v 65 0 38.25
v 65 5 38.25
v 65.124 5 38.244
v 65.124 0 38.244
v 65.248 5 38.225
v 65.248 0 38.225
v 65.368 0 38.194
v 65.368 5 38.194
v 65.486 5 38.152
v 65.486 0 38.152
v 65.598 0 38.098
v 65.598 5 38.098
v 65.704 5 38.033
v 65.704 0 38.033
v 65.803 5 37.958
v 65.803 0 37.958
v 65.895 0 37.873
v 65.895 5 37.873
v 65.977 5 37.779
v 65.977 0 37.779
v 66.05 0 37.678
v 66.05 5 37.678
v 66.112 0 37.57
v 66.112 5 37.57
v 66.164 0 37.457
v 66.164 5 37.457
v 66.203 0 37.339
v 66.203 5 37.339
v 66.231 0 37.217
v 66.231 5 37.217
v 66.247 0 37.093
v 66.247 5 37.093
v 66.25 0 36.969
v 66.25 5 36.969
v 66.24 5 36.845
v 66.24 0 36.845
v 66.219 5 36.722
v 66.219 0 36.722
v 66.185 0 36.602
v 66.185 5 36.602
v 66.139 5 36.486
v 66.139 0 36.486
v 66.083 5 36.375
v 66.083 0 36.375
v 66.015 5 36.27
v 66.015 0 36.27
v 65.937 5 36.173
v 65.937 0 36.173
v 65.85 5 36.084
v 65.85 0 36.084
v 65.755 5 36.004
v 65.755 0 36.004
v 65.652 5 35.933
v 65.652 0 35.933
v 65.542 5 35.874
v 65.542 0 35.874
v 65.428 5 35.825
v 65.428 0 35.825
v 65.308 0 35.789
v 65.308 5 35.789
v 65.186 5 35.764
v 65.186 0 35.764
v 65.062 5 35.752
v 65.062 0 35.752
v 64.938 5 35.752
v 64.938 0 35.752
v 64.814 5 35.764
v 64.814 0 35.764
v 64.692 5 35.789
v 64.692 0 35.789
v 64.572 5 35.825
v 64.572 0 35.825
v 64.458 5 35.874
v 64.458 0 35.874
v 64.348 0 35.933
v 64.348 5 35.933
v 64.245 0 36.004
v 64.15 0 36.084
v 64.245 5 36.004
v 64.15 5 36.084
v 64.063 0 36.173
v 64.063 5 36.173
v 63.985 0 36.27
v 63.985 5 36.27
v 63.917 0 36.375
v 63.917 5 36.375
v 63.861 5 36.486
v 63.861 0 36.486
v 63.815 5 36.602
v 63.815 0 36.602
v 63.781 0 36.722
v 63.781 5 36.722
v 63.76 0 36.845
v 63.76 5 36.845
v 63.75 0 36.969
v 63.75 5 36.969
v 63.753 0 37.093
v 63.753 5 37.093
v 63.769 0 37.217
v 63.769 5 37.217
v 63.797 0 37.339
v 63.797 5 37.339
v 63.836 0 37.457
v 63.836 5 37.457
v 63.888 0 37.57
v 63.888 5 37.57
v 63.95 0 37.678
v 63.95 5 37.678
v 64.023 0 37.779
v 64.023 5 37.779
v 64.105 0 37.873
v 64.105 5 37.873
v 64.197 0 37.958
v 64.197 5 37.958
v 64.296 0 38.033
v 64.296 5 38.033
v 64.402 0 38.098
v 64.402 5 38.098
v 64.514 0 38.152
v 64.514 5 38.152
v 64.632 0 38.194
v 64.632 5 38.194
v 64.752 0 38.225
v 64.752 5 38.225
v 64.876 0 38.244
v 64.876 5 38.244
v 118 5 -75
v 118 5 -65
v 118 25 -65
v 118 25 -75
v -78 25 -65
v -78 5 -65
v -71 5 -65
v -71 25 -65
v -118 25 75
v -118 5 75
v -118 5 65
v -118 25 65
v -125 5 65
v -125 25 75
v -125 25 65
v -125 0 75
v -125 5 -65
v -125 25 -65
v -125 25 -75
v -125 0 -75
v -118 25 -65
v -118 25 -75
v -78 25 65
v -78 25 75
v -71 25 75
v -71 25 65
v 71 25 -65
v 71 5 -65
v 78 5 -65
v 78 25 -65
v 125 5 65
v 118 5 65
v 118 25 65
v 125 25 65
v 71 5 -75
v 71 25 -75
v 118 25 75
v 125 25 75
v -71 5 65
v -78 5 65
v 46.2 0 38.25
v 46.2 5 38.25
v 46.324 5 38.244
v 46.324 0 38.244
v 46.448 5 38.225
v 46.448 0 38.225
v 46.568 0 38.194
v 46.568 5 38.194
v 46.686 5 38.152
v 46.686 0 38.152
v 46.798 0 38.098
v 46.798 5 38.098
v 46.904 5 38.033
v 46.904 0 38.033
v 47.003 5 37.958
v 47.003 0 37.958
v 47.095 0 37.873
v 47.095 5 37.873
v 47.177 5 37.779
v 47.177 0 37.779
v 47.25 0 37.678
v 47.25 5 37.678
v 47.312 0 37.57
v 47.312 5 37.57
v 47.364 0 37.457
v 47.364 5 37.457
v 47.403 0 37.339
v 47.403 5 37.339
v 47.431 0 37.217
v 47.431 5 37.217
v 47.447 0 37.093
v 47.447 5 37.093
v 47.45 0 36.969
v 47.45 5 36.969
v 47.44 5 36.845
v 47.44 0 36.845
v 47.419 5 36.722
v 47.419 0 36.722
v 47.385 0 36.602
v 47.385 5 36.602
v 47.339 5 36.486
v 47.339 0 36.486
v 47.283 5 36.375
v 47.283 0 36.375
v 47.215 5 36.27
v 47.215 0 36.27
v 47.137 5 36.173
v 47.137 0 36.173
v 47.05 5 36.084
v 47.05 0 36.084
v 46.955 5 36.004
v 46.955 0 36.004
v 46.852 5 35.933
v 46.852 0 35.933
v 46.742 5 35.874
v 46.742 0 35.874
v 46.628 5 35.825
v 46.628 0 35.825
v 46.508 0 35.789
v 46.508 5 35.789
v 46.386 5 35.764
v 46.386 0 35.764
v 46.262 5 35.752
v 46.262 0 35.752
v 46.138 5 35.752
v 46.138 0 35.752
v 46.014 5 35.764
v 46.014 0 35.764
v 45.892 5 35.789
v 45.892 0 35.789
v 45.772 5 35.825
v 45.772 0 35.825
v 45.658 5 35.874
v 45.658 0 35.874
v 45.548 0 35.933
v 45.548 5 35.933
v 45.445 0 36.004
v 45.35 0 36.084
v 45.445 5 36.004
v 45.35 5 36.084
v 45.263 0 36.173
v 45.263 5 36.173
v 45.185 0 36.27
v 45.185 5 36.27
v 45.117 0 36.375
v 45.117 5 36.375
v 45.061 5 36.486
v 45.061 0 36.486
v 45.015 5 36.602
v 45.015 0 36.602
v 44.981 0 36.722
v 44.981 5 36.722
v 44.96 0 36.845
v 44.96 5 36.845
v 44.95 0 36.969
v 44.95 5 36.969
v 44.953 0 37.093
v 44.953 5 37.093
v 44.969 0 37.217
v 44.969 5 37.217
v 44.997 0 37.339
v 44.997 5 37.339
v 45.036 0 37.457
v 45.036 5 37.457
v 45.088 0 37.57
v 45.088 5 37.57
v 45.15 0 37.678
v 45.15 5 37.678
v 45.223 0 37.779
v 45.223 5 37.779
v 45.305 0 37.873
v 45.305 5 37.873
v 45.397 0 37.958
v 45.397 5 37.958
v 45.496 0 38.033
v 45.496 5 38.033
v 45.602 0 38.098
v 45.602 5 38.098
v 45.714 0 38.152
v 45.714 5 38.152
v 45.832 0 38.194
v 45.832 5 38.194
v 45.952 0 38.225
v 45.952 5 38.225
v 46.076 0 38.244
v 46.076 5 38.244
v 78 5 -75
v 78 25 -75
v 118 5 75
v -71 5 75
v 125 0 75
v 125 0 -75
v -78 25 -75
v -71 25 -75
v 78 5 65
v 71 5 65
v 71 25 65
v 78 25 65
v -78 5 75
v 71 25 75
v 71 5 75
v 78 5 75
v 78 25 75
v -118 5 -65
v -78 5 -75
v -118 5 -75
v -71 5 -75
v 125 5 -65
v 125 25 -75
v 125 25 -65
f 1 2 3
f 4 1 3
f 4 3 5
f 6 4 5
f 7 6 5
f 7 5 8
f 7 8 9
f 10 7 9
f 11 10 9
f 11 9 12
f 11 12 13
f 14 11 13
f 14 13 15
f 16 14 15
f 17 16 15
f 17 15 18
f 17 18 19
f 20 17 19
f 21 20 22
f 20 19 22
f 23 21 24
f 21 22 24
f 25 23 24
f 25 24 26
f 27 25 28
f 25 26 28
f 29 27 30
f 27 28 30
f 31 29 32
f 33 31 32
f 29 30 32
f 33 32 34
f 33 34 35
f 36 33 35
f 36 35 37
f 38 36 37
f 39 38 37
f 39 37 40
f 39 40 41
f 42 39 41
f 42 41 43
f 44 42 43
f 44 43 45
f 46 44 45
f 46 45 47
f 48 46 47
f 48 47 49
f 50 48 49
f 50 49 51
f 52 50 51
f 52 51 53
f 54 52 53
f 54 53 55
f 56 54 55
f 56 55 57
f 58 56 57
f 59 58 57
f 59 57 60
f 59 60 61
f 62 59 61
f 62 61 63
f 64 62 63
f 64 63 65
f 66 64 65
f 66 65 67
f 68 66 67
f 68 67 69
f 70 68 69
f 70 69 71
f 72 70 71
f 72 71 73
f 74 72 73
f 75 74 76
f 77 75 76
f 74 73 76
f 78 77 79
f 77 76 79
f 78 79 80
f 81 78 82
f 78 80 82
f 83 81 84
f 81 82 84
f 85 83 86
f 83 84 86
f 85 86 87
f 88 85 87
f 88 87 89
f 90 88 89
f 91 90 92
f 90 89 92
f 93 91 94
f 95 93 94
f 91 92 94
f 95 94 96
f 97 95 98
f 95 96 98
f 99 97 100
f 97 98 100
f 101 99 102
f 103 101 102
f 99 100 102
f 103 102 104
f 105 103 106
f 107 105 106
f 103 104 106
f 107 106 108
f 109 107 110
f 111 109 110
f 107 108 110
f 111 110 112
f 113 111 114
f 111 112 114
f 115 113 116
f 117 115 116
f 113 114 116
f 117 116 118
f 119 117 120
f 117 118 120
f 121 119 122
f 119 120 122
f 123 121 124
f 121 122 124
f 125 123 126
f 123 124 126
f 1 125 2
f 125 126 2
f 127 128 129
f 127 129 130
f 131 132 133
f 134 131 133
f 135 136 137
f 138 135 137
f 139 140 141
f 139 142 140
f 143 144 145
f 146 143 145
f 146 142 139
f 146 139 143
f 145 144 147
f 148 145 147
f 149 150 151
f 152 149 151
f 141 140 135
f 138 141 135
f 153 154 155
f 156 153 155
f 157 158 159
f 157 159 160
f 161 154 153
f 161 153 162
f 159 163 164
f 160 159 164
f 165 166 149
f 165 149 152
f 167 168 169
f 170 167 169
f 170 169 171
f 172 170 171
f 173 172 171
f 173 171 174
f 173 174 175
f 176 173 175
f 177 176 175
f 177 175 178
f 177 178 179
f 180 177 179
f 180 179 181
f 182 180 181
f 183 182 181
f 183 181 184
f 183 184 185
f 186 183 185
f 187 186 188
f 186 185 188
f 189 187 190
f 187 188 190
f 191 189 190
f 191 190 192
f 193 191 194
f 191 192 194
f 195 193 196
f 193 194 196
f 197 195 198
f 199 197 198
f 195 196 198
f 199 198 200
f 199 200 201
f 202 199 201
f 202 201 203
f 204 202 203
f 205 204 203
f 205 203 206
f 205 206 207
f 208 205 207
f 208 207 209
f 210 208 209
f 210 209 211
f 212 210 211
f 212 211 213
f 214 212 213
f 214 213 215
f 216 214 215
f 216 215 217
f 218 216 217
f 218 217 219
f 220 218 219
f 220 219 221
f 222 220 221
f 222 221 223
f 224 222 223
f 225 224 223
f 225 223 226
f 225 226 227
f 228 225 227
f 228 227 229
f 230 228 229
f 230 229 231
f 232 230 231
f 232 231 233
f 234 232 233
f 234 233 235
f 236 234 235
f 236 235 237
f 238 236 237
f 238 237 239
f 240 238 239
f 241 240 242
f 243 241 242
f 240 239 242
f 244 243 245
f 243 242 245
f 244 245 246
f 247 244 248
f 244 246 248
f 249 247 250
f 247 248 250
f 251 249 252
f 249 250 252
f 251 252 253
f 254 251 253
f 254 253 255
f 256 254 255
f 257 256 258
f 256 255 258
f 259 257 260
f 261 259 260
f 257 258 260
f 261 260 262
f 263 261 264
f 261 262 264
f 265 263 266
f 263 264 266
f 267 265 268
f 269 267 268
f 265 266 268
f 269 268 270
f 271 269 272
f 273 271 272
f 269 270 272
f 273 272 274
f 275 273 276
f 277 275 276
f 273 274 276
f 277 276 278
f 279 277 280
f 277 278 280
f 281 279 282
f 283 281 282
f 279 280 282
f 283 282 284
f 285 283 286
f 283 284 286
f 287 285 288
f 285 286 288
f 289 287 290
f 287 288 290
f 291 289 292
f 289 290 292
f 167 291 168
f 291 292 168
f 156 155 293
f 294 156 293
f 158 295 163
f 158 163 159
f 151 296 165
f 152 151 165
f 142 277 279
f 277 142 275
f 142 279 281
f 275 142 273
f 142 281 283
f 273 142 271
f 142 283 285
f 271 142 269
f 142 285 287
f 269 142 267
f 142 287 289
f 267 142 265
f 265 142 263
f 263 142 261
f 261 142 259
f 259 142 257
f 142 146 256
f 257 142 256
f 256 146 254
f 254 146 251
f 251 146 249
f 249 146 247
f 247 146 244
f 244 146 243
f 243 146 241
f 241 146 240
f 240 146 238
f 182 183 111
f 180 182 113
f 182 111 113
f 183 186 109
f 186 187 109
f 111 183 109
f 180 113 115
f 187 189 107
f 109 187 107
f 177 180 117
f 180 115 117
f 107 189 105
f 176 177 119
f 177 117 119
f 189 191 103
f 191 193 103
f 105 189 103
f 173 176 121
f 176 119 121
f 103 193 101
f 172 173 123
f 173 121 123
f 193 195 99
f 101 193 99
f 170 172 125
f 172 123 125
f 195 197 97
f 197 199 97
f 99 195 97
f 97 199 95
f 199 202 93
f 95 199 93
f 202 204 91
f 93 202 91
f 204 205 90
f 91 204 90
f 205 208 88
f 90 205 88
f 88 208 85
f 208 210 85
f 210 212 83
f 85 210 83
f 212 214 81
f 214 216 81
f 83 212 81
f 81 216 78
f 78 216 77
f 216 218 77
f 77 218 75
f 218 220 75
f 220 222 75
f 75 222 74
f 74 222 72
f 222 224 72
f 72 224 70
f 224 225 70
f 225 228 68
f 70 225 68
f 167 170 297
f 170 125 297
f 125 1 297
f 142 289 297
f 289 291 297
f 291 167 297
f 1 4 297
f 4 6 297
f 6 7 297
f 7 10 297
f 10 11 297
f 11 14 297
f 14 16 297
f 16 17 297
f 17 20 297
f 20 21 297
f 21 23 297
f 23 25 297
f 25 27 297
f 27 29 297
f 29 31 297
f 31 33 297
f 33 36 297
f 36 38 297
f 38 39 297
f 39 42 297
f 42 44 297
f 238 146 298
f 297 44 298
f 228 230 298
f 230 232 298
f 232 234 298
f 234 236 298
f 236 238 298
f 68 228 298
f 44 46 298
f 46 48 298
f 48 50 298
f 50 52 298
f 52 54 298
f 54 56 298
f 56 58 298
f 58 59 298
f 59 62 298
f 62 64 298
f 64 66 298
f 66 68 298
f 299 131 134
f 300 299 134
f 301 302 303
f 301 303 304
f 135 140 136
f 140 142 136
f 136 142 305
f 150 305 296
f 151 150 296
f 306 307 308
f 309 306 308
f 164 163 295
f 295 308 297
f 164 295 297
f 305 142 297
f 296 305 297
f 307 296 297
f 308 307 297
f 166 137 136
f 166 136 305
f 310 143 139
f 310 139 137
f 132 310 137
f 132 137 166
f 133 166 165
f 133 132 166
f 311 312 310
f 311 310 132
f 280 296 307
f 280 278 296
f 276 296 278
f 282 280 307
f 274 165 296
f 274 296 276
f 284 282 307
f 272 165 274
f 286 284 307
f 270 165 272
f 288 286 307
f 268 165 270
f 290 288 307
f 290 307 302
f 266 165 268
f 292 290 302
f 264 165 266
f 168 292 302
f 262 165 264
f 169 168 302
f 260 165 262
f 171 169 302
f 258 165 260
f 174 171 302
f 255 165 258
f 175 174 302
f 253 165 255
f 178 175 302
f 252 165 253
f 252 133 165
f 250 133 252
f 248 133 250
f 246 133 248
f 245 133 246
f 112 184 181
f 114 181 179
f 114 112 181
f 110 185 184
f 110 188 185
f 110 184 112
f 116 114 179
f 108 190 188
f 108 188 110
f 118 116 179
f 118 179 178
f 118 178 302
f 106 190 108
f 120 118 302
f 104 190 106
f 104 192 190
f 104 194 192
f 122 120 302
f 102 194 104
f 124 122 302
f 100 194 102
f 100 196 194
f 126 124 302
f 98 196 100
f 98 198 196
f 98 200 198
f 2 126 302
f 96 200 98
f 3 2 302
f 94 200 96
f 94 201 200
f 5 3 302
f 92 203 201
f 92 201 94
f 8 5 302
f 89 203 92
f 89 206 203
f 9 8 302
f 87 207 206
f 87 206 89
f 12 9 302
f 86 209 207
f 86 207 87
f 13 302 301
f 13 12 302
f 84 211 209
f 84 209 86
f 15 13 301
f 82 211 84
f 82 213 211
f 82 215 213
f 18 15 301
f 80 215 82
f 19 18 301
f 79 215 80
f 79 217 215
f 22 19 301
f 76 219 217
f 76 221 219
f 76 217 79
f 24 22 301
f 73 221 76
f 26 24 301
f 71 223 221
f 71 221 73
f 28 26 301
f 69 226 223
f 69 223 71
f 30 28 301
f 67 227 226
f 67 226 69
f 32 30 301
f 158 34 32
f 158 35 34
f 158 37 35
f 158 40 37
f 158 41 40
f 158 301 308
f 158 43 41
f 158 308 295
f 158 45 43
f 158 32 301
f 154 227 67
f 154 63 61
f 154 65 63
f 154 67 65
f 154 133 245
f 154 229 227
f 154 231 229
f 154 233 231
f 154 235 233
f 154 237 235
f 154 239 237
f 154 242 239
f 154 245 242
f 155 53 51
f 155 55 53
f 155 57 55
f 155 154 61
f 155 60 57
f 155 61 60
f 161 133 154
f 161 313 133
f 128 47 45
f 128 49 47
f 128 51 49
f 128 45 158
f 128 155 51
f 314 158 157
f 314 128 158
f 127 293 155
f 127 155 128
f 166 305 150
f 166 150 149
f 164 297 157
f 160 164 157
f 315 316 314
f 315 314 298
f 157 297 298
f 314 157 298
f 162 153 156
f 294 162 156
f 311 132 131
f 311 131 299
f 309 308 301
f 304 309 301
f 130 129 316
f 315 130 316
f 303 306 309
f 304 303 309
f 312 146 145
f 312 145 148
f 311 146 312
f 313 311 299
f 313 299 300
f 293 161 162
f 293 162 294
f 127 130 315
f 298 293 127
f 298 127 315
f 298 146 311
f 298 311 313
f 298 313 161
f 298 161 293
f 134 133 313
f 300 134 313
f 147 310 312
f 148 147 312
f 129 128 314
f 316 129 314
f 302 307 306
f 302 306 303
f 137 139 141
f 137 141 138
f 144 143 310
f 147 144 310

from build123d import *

# Parameters (mm, degrees)
SKETCH1_W           = 250
SKETCH1_H           = 150
BOSS_EXTRUDE1_DEPTH = 5
SKETCH2_W           = 7
SKETCH2_H           = 10
BOSS_EXTRUDE2_DEPTH = 20
SKETCH3_R           = 1.25
CUT_EXTRUDE1_DEPTH  = 148.139389696


with BuildPart() as part:
    # Sketch1 → Boss-Extrude1 (new body)
    with BuildSketch(Plane(origin=(0, 0, 0), x_dir=(1, 0, 0), z_dir=(0, 1, 0))):
        Rectangle(SKETCH1_W, SKETCH1_H)
    extrude(amount=BOSS_EXTRUDE1_DEPTH)

    # Sketch2 → Boss-Extrude2 (add)
    with BuildSketch(Plane(origin=(0, 5, 0), x_dir=(1, 0, 0), z_dir=(0, 1, 0))):
        with Locations((-121.5, -70)):
            Rectangle(SKETCH2_W, SKETCH2_H)
        with Locations((-74.5, -70)):
            Rectangle(SKETCH2_W, SKETCH2_H)
        with Locations((-121.5, 70)):
            Rectangle(SKETCH2_W, SKETCH2_H)
        with Locations((-74.5, 70)):
            Rectangle(SKETCH2_W, SKETCH2_H)
        with Locations((121.5, 70)):
            Rectangle(SKETCH2_W, SKETCH2_H)
        with Locations((74.5, 70)):
            Rectangle(SKETCH2_W, SKETCH2_H)
        with Locations((121.5, -70)):
            Rectangle(SKETCH2_W, SKETCH2_H)
        with Locations((74.5, -70)):
            Rectangle(SKETCH2_W, SKETCH2_H)
    extrude(amount=BOSS_EXTRUDE2_DEPTH)

    # Sketch3 → Cut-Extrude1 (cut, through all)
    with BuildSketch(Plane(origin=(0, 5, 0), x_dir=(1, 0, 0), z_dir=(0, 1, 0))):
        with Locations(Location((46.2, -37, 0), (0, 0, 270))):
            Circle(SKETCH3_R)
        with Locations(Location((65, -37, 0), (0, 0, 270))):
            Circle(SKETCH3_R)
    extrude(amount=-CUT_EXTRUDE1_DEPTH, mode=Mode.SUBTRACT)


solid = part.part
